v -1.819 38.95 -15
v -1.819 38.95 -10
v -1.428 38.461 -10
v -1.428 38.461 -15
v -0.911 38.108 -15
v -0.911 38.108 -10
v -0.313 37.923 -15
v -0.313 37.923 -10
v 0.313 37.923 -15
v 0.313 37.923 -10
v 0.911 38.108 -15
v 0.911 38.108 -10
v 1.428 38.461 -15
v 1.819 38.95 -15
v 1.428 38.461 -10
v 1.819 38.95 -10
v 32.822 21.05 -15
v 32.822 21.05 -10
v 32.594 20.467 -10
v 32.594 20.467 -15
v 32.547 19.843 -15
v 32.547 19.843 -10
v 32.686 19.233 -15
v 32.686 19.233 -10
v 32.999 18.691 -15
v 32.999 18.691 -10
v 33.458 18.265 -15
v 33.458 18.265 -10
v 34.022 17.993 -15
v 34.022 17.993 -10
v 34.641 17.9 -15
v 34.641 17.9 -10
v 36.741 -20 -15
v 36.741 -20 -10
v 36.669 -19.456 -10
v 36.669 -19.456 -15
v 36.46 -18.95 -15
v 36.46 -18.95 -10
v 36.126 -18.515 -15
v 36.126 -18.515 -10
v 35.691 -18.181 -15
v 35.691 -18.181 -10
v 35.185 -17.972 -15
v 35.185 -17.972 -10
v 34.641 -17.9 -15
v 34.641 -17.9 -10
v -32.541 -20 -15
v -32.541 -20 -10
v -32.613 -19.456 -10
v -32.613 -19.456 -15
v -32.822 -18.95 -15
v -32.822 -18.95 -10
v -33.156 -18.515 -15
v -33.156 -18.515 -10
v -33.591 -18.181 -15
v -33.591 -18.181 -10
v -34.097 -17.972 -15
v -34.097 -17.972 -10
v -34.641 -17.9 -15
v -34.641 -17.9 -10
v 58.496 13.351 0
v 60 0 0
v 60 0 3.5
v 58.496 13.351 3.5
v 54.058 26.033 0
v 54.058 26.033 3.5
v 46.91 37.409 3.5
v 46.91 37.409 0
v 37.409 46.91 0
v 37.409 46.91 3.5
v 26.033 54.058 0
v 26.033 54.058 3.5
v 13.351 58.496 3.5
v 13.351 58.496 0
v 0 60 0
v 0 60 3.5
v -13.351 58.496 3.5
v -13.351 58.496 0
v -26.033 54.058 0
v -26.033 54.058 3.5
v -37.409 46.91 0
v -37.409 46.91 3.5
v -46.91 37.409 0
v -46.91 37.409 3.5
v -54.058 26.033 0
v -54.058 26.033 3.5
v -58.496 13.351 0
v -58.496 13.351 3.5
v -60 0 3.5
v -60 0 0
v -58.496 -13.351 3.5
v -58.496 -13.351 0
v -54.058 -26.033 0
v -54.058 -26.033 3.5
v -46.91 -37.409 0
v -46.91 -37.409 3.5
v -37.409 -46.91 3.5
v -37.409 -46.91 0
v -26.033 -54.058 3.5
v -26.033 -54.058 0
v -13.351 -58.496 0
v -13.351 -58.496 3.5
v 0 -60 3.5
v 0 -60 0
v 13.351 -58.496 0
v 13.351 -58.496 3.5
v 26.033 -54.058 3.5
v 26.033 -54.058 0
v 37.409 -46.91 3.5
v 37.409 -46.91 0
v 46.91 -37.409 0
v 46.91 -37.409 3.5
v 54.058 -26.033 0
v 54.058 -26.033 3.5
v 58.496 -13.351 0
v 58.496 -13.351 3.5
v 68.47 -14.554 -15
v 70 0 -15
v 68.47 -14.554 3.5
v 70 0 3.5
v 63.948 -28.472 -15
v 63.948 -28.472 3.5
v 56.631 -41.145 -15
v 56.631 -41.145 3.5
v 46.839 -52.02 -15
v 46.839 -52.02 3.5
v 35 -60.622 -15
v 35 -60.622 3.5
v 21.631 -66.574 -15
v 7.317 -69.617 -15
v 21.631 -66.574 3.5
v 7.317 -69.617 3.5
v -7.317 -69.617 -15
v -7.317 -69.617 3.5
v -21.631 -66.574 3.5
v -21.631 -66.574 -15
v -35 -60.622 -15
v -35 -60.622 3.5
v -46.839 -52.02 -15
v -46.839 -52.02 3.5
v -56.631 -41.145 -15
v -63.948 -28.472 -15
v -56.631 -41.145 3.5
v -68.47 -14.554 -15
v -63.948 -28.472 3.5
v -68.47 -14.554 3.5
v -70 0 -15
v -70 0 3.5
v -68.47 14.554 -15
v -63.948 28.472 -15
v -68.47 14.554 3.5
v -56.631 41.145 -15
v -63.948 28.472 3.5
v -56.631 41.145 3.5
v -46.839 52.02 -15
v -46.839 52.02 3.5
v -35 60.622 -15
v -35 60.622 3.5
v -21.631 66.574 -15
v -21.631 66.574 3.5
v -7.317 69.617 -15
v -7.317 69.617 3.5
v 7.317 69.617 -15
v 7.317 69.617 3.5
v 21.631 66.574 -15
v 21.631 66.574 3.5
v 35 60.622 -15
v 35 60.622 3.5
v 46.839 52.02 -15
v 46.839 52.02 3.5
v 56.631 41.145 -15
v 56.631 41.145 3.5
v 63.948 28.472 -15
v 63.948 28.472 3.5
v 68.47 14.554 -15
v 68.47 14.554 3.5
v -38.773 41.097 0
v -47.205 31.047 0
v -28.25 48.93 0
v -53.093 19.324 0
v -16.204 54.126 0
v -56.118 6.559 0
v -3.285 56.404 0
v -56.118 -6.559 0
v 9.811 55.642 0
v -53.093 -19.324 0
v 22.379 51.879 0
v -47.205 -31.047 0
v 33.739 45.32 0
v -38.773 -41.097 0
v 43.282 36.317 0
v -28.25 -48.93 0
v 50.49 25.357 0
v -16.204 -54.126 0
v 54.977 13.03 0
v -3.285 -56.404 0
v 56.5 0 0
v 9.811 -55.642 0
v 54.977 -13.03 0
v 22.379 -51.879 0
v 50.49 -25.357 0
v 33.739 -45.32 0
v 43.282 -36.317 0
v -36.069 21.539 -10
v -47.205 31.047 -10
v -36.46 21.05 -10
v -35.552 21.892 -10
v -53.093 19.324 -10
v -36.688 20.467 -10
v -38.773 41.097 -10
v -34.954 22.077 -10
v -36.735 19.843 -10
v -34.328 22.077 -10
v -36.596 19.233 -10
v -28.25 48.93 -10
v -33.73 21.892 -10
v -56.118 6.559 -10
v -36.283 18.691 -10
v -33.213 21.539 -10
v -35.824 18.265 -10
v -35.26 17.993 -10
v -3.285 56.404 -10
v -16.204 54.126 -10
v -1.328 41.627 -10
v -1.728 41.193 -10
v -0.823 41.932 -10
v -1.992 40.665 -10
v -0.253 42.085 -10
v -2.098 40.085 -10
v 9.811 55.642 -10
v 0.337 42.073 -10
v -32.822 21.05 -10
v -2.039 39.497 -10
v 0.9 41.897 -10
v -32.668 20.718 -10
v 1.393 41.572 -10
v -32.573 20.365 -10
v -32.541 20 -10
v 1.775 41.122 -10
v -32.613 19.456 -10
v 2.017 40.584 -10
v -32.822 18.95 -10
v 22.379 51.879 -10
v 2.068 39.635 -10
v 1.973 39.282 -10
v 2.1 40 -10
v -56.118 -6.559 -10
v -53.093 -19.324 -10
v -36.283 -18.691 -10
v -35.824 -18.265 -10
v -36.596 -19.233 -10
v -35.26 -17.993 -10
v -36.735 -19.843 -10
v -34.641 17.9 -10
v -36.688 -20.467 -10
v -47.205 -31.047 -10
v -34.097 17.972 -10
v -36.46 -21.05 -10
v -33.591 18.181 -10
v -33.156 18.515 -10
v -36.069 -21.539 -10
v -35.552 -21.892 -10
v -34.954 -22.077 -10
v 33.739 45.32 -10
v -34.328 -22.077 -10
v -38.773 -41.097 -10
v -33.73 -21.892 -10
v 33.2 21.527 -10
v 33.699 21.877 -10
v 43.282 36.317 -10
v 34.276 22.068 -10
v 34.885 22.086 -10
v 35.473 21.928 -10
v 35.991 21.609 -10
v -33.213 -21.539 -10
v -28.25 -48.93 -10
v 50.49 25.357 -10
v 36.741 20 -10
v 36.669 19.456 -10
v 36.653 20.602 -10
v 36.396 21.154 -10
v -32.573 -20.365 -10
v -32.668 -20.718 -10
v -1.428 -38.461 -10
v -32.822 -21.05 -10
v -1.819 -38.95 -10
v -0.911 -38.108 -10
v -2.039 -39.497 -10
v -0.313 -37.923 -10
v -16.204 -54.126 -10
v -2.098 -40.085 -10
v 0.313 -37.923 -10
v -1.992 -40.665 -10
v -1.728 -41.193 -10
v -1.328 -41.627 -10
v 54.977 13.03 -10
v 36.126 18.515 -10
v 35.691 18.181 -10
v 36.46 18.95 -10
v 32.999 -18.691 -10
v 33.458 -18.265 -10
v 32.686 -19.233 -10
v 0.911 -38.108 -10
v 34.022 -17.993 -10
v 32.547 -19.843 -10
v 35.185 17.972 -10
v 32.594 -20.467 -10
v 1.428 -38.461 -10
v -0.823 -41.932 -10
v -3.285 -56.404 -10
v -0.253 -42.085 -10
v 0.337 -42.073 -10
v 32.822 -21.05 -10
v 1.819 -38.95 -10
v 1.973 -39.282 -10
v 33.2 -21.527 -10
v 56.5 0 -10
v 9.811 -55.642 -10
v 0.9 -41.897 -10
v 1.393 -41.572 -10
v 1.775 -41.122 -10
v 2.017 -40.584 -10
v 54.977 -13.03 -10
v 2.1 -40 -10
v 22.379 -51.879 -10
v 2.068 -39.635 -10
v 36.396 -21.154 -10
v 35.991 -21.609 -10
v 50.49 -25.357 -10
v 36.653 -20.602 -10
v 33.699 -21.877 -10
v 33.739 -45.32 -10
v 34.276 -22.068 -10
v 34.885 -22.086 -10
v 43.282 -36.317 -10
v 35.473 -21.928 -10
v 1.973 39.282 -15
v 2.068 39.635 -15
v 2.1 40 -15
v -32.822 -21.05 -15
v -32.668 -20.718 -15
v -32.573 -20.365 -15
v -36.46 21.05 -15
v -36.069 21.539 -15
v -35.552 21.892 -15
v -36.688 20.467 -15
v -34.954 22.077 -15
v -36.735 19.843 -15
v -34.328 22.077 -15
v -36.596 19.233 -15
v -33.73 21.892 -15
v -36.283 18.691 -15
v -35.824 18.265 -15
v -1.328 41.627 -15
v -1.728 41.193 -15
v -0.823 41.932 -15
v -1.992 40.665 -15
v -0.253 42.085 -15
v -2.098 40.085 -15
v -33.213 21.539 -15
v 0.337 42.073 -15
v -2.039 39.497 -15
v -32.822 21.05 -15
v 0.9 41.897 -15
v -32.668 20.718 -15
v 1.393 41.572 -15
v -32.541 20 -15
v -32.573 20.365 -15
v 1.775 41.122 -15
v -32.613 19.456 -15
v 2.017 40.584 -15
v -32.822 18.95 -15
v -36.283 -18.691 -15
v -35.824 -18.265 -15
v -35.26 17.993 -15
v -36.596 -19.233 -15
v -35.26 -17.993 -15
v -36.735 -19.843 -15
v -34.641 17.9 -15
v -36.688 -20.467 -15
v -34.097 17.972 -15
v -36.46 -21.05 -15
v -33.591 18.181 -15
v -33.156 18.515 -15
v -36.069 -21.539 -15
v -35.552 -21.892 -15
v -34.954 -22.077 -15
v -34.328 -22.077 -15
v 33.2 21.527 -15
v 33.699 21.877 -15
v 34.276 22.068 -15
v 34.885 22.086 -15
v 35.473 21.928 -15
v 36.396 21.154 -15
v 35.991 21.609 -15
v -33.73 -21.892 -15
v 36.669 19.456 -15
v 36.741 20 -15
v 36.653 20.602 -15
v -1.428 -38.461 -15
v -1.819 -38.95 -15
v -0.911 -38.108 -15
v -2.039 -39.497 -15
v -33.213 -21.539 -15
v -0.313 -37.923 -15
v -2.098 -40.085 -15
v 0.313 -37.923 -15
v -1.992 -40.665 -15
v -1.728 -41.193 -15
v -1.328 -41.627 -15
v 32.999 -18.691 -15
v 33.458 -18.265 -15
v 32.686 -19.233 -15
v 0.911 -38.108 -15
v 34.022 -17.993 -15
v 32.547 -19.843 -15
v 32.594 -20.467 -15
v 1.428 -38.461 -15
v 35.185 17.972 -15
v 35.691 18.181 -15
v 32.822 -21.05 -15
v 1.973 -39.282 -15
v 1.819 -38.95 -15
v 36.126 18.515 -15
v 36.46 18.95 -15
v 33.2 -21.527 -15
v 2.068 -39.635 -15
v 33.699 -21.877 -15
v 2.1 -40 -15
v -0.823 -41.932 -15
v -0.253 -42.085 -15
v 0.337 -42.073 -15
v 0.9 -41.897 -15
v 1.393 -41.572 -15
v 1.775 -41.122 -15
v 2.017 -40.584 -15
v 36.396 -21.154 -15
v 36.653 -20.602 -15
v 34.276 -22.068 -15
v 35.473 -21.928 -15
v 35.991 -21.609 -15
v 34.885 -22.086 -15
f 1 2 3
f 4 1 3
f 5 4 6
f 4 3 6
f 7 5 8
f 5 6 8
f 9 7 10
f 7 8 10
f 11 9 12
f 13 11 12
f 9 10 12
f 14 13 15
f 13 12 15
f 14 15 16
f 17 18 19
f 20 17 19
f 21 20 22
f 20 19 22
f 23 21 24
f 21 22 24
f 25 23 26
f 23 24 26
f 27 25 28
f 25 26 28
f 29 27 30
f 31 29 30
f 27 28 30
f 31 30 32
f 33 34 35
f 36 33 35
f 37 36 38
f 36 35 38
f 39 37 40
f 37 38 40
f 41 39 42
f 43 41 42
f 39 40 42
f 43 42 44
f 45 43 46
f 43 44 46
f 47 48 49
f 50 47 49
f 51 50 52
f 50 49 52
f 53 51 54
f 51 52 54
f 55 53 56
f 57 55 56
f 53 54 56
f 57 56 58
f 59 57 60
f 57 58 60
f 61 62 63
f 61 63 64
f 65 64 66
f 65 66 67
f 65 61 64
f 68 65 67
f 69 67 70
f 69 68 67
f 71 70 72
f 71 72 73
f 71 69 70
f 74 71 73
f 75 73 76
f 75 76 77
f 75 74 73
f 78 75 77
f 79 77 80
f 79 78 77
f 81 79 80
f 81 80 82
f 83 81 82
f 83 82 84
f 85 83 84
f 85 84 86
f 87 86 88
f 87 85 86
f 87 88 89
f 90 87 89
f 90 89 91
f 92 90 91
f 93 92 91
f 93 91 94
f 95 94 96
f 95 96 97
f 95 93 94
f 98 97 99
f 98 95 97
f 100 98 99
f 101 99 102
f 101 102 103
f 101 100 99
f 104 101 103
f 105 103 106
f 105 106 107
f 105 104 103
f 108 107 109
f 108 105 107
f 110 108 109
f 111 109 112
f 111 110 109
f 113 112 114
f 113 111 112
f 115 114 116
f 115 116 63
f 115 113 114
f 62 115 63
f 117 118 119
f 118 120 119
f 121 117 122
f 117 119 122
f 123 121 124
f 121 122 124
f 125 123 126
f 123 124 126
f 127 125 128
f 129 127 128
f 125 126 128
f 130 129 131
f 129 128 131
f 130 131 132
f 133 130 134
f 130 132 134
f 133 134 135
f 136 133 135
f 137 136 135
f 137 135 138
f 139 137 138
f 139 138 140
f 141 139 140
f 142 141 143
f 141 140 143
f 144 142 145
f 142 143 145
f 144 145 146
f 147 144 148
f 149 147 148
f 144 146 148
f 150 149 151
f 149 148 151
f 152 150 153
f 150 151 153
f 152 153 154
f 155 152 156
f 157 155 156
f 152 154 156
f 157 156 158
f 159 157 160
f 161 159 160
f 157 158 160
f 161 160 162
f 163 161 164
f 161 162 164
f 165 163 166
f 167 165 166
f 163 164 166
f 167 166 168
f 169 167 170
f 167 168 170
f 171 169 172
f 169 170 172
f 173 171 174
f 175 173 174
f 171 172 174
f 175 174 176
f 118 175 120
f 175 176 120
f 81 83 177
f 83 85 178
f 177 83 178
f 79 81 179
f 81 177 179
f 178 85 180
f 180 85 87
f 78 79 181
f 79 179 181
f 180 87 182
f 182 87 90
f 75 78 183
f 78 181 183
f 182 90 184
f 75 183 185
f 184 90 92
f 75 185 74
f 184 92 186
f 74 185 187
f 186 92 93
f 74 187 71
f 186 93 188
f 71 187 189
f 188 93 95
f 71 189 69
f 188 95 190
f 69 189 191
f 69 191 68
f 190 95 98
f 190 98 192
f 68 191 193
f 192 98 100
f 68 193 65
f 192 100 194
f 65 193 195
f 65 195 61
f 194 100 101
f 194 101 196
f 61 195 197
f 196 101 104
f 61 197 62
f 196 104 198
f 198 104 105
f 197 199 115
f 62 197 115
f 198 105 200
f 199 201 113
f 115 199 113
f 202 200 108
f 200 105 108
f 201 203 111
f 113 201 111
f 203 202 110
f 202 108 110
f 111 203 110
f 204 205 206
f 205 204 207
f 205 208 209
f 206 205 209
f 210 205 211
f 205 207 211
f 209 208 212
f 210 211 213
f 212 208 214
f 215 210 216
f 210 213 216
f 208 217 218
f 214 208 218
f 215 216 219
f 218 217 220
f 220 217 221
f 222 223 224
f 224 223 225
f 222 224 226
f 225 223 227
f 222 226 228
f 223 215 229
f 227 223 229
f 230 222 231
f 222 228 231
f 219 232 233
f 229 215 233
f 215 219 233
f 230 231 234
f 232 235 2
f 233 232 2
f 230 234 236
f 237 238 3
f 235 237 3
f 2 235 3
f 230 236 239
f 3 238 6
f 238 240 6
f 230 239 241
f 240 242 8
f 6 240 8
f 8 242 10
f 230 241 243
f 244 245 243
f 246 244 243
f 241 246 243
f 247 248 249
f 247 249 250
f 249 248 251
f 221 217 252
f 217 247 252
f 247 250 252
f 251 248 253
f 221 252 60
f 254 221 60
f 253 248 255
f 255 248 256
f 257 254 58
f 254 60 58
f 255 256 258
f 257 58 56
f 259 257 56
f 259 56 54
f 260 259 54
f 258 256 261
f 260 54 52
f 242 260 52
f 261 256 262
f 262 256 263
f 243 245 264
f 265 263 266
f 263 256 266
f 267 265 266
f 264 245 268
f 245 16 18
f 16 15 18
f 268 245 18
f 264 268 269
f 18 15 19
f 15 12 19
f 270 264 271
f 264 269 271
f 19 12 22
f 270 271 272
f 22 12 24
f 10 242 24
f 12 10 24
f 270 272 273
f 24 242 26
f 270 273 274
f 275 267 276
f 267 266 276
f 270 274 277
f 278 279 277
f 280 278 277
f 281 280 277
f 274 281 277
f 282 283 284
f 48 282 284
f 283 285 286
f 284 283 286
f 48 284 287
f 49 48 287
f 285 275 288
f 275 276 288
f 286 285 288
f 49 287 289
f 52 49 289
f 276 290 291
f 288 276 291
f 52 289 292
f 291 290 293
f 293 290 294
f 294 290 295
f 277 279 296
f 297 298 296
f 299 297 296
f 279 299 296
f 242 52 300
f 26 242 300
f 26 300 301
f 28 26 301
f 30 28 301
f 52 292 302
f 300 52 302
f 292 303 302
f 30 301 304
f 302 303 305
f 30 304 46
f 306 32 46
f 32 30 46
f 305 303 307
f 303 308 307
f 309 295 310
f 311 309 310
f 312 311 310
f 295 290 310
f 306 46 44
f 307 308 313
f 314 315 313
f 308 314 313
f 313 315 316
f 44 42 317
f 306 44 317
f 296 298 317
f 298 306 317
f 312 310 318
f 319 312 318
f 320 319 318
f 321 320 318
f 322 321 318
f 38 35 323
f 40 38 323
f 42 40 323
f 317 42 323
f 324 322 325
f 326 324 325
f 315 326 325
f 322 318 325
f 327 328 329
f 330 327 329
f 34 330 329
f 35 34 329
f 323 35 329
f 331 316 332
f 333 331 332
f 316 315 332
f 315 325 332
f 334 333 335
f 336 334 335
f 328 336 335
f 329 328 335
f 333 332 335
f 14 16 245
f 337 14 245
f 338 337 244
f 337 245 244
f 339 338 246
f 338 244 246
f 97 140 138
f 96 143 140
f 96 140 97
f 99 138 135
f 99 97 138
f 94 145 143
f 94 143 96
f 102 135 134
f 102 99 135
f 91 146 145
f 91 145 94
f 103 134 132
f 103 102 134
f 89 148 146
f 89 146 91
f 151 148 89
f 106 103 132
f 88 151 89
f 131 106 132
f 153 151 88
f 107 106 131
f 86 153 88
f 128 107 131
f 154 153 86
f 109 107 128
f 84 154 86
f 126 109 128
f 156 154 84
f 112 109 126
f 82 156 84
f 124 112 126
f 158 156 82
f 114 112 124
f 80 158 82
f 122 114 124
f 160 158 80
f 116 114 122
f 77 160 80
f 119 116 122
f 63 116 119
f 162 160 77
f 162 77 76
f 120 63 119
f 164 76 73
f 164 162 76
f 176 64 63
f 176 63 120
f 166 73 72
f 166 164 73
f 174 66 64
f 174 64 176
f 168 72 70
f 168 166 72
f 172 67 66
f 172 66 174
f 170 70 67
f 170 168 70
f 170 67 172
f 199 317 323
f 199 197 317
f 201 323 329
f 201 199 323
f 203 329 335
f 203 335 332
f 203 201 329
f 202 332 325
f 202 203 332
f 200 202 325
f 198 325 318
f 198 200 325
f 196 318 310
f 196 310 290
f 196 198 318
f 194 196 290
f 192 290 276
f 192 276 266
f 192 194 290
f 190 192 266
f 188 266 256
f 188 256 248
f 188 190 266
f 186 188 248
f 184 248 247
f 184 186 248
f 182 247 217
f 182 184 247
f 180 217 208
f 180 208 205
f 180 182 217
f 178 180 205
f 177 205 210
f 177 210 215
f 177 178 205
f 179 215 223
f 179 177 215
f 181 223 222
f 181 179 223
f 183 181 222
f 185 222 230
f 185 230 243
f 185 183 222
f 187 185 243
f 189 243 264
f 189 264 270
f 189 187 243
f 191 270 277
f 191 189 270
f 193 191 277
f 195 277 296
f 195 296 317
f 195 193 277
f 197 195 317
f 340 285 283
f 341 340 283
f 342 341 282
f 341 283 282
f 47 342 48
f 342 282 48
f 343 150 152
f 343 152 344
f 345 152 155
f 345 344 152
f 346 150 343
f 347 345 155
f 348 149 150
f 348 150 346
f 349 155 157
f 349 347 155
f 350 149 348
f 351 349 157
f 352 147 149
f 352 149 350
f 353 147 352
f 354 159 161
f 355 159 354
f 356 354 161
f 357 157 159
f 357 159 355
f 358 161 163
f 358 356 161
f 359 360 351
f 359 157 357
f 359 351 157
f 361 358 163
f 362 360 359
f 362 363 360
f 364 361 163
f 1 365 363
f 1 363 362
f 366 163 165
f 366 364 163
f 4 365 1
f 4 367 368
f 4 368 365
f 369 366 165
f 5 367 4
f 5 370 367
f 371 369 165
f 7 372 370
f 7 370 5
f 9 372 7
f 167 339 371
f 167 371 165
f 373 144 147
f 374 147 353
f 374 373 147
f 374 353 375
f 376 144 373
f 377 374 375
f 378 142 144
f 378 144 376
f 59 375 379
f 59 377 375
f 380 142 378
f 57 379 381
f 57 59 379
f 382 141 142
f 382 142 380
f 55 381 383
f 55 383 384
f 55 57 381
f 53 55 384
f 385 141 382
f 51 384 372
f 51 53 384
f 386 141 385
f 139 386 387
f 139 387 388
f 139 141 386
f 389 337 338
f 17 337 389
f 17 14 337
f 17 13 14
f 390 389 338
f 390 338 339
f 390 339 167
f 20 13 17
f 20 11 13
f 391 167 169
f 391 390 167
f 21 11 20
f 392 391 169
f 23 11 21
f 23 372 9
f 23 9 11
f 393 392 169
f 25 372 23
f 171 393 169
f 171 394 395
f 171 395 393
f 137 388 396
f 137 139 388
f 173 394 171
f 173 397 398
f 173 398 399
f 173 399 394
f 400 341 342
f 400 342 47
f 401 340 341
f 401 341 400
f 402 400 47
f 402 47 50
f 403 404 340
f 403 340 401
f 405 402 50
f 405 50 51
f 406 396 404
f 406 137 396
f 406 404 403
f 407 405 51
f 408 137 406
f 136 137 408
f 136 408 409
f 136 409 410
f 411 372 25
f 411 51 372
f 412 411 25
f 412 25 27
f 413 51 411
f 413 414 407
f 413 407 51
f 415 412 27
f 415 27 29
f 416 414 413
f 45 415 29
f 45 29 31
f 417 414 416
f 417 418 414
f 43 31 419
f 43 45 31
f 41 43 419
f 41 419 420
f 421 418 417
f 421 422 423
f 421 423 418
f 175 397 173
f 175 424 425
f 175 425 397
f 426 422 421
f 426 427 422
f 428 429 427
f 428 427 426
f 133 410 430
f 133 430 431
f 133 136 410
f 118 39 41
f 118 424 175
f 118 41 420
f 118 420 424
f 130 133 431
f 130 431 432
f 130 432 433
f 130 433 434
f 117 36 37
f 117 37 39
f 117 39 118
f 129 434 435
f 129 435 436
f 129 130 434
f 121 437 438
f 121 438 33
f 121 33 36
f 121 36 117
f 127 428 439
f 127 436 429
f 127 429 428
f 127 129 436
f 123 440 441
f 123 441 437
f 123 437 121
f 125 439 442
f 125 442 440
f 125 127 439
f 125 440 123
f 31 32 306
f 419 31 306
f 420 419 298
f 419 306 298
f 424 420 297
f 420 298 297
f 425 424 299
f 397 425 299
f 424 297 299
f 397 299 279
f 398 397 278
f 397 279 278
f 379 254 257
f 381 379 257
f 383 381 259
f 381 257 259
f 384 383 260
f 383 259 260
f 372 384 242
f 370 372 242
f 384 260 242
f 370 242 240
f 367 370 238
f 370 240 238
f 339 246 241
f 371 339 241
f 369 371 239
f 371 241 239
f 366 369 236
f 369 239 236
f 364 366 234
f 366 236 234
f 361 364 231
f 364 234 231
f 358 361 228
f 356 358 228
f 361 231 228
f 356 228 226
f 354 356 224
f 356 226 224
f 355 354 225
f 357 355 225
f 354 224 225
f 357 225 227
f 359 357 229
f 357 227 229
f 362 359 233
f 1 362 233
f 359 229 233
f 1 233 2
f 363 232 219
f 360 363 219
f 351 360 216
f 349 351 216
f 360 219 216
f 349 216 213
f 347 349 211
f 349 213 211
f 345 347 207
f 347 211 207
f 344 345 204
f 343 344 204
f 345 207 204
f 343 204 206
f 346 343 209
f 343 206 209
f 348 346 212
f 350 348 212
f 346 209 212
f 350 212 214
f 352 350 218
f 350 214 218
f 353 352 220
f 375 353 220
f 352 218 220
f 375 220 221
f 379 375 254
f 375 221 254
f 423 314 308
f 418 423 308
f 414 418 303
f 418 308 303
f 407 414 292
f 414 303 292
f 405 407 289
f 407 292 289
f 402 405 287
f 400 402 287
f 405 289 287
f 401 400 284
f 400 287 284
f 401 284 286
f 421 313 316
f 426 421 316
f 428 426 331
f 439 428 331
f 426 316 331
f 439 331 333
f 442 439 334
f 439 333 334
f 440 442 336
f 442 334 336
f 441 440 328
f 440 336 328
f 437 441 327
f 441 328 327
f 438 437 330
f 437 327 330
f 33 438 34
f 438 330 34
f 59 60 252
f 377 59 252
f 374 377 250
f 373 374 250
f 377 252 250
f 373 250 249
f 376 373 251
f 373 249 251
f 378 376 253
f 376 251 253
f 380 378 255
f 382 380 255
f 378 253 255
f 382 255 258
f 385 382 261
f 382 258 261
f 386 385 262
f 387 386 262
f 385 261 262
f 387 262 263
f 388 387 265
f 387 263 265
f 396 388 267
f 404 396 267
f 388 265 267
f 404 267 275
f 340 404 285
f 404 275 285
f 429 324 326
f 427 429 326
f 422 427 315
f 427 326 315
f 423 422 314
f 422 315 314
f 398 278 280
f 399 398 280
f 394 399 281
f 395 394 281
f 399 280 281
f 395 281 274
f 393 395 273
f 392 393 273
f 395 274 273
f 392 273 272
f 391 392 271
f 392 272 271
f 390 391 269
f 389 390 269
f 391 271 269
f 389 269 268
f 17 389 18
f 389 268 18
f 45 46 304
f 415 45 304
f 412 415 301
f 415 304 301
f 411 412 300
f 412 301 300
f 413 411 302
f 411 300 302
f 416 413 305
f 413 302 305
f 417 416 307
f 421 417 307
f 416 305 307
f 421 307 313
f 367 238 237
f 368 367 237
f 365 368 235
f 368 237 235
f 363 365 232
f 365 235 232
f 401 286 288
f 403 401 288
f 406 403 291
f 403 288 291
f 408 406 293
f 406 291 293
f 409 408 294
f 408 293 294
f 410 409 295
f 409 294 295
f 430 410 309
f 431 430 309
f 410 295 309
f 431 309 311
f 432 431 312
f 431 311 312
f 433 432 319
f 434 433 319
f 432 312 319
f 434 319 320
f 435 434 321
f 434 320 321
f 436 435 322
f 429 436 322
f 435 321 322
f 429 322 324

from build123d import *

# Parameters (mm, degrees)
F0_R     = 70
F0_R_2   = 60
F1_DEPTH = 3.5
F2_R     = 70
F2_R_2   = 56.5
F3_DEPTH = 5
F4_R     = 70
F4_R_2   = 56.5
F5_DEPTH = 5
F6_R     = 70
F7_DEPTH = 5


with BuildPart() as f1:
    # F0 (on Top) → F1 (new body)
    with BuildSketch(Plane.XY):
        Circle(F0_R)
        Circle(F0_R_2, mode=Mode.SUBTRACT)
    extrude(amount=F1_DEPTH)



with BuildPart() as f3:
    # F2 (on face) → F3 (new body)
    with BuildSketch(Plane(origin=(0, 0, -5), x_dir=(1, 0, 0), z_dir=(0, 0, -1))):
        Circle(F2_R)
        Circle(F2_R_2, mode=Mode.SUBTRACT)
    extrude(amount=F3_DEPTH)


with BuildPart() as f1_1:
    add(f1.part)

    add(f3.part)  # F5 merges F3
    # F4 (on face) → F5 (join)
    with BuildSketch(Plane(origin=(0, 0, 0), x_dir=(1, 0, 0), z_dir=(0, 0, -1))):
        Circle(F4_R)
        Circle(F4_R_2, mode=Mode.SUBTRACT)
    extrude(amount=F5_DEPTH)

    # F6 (on face) → F7 (join)
    with BuildSketch(Plane(origin=(0, 0, -10), x_dir=(1, 0, 0), z_dir=(0, 0, -1))):
        Circle(F6_R)
        with BuildLine():
            ThreePointArc((-32.822363, -21.05), (-36.459669, -21.05), (-34.641016, -17.9))
            ThreePointArc((-34.641016, -17.9), (-33.156092, -18.515076), (-32.541016, -20))
            ThreePointArc((-32.541016, -20), (-32.612572, -20.54352), (-32.822363, -21.05))
        make_face(mode=Mode.SUBTRACT)
        with BuildLine():
            ThreePointArc((2.1, -40), (-0.54352, -42.028444), (-1.818653, -38.95))
            ThreePointArc((-1.818653, -38.95), (0, -37.9), (1.818653, -38.95))
            ThreePointArc((1.818653, -38.95), (2.028444, -39.45648), (2.1, -40))
        make_face(mode=Mode.SUBTRACT)
        with BuildLine():
            ThreePointArc((36.741016, -20), (35.184536, -22.028444), (32.822363, -21.05))
            ThreePointArc((32.822363, -21.05), (32.822363, -18.95), (34.641016, -17.9))
            ThreePointArc((34.641016, -17.9), (36.12594, -18.515076), (36.741016, -20))
        make_face(mode=Mode.SUBTRACT)
        with BuildLine():
            ThreePointArc((-34.641016, 17.9), (-36.459669, 21.05), (-32.822363, 21.05))
            ThreePointArc((-32.822363, 21.05), (-32.612572, 20.54352), (-32.541016, 20))
            ThreePointArc((-32.541016, 20), (-33.156092, 18.515076), (-34.641016, 17.9))
        make_face(mode=Mode.SUBTRACT)
        with BuildLine():
            ThreePointArc((36.741016, 20), (36.12594, 18.515076), (34.641016, 17.9))
            ThreePointArc((34.641016, 17.9), (32.822363, 18.95), (32.822363, 21.05))
            ThreePointArc((32.822363, 21.05), (35.184536, 22.028444), (36.741016, 20))
        make_face(mode=Mode.SUBTRACT)
        with BuildLine():
            ThreePointArc((2.1, 40), (2.028444, 39.45648), (1.818653, 38.95))
            ThreePointArc((1.818653, 38.95), (0, 37.9), (-1.818653, 38.95))
            ThreePointArc((-1.818653, 38.95), (-0.54352, 42.028444), (2.1, 40))
        make_face(mode=Mode.SUBTRACT)
    extrude(amount=F7_DEPTH)


solid = f1_1.part
